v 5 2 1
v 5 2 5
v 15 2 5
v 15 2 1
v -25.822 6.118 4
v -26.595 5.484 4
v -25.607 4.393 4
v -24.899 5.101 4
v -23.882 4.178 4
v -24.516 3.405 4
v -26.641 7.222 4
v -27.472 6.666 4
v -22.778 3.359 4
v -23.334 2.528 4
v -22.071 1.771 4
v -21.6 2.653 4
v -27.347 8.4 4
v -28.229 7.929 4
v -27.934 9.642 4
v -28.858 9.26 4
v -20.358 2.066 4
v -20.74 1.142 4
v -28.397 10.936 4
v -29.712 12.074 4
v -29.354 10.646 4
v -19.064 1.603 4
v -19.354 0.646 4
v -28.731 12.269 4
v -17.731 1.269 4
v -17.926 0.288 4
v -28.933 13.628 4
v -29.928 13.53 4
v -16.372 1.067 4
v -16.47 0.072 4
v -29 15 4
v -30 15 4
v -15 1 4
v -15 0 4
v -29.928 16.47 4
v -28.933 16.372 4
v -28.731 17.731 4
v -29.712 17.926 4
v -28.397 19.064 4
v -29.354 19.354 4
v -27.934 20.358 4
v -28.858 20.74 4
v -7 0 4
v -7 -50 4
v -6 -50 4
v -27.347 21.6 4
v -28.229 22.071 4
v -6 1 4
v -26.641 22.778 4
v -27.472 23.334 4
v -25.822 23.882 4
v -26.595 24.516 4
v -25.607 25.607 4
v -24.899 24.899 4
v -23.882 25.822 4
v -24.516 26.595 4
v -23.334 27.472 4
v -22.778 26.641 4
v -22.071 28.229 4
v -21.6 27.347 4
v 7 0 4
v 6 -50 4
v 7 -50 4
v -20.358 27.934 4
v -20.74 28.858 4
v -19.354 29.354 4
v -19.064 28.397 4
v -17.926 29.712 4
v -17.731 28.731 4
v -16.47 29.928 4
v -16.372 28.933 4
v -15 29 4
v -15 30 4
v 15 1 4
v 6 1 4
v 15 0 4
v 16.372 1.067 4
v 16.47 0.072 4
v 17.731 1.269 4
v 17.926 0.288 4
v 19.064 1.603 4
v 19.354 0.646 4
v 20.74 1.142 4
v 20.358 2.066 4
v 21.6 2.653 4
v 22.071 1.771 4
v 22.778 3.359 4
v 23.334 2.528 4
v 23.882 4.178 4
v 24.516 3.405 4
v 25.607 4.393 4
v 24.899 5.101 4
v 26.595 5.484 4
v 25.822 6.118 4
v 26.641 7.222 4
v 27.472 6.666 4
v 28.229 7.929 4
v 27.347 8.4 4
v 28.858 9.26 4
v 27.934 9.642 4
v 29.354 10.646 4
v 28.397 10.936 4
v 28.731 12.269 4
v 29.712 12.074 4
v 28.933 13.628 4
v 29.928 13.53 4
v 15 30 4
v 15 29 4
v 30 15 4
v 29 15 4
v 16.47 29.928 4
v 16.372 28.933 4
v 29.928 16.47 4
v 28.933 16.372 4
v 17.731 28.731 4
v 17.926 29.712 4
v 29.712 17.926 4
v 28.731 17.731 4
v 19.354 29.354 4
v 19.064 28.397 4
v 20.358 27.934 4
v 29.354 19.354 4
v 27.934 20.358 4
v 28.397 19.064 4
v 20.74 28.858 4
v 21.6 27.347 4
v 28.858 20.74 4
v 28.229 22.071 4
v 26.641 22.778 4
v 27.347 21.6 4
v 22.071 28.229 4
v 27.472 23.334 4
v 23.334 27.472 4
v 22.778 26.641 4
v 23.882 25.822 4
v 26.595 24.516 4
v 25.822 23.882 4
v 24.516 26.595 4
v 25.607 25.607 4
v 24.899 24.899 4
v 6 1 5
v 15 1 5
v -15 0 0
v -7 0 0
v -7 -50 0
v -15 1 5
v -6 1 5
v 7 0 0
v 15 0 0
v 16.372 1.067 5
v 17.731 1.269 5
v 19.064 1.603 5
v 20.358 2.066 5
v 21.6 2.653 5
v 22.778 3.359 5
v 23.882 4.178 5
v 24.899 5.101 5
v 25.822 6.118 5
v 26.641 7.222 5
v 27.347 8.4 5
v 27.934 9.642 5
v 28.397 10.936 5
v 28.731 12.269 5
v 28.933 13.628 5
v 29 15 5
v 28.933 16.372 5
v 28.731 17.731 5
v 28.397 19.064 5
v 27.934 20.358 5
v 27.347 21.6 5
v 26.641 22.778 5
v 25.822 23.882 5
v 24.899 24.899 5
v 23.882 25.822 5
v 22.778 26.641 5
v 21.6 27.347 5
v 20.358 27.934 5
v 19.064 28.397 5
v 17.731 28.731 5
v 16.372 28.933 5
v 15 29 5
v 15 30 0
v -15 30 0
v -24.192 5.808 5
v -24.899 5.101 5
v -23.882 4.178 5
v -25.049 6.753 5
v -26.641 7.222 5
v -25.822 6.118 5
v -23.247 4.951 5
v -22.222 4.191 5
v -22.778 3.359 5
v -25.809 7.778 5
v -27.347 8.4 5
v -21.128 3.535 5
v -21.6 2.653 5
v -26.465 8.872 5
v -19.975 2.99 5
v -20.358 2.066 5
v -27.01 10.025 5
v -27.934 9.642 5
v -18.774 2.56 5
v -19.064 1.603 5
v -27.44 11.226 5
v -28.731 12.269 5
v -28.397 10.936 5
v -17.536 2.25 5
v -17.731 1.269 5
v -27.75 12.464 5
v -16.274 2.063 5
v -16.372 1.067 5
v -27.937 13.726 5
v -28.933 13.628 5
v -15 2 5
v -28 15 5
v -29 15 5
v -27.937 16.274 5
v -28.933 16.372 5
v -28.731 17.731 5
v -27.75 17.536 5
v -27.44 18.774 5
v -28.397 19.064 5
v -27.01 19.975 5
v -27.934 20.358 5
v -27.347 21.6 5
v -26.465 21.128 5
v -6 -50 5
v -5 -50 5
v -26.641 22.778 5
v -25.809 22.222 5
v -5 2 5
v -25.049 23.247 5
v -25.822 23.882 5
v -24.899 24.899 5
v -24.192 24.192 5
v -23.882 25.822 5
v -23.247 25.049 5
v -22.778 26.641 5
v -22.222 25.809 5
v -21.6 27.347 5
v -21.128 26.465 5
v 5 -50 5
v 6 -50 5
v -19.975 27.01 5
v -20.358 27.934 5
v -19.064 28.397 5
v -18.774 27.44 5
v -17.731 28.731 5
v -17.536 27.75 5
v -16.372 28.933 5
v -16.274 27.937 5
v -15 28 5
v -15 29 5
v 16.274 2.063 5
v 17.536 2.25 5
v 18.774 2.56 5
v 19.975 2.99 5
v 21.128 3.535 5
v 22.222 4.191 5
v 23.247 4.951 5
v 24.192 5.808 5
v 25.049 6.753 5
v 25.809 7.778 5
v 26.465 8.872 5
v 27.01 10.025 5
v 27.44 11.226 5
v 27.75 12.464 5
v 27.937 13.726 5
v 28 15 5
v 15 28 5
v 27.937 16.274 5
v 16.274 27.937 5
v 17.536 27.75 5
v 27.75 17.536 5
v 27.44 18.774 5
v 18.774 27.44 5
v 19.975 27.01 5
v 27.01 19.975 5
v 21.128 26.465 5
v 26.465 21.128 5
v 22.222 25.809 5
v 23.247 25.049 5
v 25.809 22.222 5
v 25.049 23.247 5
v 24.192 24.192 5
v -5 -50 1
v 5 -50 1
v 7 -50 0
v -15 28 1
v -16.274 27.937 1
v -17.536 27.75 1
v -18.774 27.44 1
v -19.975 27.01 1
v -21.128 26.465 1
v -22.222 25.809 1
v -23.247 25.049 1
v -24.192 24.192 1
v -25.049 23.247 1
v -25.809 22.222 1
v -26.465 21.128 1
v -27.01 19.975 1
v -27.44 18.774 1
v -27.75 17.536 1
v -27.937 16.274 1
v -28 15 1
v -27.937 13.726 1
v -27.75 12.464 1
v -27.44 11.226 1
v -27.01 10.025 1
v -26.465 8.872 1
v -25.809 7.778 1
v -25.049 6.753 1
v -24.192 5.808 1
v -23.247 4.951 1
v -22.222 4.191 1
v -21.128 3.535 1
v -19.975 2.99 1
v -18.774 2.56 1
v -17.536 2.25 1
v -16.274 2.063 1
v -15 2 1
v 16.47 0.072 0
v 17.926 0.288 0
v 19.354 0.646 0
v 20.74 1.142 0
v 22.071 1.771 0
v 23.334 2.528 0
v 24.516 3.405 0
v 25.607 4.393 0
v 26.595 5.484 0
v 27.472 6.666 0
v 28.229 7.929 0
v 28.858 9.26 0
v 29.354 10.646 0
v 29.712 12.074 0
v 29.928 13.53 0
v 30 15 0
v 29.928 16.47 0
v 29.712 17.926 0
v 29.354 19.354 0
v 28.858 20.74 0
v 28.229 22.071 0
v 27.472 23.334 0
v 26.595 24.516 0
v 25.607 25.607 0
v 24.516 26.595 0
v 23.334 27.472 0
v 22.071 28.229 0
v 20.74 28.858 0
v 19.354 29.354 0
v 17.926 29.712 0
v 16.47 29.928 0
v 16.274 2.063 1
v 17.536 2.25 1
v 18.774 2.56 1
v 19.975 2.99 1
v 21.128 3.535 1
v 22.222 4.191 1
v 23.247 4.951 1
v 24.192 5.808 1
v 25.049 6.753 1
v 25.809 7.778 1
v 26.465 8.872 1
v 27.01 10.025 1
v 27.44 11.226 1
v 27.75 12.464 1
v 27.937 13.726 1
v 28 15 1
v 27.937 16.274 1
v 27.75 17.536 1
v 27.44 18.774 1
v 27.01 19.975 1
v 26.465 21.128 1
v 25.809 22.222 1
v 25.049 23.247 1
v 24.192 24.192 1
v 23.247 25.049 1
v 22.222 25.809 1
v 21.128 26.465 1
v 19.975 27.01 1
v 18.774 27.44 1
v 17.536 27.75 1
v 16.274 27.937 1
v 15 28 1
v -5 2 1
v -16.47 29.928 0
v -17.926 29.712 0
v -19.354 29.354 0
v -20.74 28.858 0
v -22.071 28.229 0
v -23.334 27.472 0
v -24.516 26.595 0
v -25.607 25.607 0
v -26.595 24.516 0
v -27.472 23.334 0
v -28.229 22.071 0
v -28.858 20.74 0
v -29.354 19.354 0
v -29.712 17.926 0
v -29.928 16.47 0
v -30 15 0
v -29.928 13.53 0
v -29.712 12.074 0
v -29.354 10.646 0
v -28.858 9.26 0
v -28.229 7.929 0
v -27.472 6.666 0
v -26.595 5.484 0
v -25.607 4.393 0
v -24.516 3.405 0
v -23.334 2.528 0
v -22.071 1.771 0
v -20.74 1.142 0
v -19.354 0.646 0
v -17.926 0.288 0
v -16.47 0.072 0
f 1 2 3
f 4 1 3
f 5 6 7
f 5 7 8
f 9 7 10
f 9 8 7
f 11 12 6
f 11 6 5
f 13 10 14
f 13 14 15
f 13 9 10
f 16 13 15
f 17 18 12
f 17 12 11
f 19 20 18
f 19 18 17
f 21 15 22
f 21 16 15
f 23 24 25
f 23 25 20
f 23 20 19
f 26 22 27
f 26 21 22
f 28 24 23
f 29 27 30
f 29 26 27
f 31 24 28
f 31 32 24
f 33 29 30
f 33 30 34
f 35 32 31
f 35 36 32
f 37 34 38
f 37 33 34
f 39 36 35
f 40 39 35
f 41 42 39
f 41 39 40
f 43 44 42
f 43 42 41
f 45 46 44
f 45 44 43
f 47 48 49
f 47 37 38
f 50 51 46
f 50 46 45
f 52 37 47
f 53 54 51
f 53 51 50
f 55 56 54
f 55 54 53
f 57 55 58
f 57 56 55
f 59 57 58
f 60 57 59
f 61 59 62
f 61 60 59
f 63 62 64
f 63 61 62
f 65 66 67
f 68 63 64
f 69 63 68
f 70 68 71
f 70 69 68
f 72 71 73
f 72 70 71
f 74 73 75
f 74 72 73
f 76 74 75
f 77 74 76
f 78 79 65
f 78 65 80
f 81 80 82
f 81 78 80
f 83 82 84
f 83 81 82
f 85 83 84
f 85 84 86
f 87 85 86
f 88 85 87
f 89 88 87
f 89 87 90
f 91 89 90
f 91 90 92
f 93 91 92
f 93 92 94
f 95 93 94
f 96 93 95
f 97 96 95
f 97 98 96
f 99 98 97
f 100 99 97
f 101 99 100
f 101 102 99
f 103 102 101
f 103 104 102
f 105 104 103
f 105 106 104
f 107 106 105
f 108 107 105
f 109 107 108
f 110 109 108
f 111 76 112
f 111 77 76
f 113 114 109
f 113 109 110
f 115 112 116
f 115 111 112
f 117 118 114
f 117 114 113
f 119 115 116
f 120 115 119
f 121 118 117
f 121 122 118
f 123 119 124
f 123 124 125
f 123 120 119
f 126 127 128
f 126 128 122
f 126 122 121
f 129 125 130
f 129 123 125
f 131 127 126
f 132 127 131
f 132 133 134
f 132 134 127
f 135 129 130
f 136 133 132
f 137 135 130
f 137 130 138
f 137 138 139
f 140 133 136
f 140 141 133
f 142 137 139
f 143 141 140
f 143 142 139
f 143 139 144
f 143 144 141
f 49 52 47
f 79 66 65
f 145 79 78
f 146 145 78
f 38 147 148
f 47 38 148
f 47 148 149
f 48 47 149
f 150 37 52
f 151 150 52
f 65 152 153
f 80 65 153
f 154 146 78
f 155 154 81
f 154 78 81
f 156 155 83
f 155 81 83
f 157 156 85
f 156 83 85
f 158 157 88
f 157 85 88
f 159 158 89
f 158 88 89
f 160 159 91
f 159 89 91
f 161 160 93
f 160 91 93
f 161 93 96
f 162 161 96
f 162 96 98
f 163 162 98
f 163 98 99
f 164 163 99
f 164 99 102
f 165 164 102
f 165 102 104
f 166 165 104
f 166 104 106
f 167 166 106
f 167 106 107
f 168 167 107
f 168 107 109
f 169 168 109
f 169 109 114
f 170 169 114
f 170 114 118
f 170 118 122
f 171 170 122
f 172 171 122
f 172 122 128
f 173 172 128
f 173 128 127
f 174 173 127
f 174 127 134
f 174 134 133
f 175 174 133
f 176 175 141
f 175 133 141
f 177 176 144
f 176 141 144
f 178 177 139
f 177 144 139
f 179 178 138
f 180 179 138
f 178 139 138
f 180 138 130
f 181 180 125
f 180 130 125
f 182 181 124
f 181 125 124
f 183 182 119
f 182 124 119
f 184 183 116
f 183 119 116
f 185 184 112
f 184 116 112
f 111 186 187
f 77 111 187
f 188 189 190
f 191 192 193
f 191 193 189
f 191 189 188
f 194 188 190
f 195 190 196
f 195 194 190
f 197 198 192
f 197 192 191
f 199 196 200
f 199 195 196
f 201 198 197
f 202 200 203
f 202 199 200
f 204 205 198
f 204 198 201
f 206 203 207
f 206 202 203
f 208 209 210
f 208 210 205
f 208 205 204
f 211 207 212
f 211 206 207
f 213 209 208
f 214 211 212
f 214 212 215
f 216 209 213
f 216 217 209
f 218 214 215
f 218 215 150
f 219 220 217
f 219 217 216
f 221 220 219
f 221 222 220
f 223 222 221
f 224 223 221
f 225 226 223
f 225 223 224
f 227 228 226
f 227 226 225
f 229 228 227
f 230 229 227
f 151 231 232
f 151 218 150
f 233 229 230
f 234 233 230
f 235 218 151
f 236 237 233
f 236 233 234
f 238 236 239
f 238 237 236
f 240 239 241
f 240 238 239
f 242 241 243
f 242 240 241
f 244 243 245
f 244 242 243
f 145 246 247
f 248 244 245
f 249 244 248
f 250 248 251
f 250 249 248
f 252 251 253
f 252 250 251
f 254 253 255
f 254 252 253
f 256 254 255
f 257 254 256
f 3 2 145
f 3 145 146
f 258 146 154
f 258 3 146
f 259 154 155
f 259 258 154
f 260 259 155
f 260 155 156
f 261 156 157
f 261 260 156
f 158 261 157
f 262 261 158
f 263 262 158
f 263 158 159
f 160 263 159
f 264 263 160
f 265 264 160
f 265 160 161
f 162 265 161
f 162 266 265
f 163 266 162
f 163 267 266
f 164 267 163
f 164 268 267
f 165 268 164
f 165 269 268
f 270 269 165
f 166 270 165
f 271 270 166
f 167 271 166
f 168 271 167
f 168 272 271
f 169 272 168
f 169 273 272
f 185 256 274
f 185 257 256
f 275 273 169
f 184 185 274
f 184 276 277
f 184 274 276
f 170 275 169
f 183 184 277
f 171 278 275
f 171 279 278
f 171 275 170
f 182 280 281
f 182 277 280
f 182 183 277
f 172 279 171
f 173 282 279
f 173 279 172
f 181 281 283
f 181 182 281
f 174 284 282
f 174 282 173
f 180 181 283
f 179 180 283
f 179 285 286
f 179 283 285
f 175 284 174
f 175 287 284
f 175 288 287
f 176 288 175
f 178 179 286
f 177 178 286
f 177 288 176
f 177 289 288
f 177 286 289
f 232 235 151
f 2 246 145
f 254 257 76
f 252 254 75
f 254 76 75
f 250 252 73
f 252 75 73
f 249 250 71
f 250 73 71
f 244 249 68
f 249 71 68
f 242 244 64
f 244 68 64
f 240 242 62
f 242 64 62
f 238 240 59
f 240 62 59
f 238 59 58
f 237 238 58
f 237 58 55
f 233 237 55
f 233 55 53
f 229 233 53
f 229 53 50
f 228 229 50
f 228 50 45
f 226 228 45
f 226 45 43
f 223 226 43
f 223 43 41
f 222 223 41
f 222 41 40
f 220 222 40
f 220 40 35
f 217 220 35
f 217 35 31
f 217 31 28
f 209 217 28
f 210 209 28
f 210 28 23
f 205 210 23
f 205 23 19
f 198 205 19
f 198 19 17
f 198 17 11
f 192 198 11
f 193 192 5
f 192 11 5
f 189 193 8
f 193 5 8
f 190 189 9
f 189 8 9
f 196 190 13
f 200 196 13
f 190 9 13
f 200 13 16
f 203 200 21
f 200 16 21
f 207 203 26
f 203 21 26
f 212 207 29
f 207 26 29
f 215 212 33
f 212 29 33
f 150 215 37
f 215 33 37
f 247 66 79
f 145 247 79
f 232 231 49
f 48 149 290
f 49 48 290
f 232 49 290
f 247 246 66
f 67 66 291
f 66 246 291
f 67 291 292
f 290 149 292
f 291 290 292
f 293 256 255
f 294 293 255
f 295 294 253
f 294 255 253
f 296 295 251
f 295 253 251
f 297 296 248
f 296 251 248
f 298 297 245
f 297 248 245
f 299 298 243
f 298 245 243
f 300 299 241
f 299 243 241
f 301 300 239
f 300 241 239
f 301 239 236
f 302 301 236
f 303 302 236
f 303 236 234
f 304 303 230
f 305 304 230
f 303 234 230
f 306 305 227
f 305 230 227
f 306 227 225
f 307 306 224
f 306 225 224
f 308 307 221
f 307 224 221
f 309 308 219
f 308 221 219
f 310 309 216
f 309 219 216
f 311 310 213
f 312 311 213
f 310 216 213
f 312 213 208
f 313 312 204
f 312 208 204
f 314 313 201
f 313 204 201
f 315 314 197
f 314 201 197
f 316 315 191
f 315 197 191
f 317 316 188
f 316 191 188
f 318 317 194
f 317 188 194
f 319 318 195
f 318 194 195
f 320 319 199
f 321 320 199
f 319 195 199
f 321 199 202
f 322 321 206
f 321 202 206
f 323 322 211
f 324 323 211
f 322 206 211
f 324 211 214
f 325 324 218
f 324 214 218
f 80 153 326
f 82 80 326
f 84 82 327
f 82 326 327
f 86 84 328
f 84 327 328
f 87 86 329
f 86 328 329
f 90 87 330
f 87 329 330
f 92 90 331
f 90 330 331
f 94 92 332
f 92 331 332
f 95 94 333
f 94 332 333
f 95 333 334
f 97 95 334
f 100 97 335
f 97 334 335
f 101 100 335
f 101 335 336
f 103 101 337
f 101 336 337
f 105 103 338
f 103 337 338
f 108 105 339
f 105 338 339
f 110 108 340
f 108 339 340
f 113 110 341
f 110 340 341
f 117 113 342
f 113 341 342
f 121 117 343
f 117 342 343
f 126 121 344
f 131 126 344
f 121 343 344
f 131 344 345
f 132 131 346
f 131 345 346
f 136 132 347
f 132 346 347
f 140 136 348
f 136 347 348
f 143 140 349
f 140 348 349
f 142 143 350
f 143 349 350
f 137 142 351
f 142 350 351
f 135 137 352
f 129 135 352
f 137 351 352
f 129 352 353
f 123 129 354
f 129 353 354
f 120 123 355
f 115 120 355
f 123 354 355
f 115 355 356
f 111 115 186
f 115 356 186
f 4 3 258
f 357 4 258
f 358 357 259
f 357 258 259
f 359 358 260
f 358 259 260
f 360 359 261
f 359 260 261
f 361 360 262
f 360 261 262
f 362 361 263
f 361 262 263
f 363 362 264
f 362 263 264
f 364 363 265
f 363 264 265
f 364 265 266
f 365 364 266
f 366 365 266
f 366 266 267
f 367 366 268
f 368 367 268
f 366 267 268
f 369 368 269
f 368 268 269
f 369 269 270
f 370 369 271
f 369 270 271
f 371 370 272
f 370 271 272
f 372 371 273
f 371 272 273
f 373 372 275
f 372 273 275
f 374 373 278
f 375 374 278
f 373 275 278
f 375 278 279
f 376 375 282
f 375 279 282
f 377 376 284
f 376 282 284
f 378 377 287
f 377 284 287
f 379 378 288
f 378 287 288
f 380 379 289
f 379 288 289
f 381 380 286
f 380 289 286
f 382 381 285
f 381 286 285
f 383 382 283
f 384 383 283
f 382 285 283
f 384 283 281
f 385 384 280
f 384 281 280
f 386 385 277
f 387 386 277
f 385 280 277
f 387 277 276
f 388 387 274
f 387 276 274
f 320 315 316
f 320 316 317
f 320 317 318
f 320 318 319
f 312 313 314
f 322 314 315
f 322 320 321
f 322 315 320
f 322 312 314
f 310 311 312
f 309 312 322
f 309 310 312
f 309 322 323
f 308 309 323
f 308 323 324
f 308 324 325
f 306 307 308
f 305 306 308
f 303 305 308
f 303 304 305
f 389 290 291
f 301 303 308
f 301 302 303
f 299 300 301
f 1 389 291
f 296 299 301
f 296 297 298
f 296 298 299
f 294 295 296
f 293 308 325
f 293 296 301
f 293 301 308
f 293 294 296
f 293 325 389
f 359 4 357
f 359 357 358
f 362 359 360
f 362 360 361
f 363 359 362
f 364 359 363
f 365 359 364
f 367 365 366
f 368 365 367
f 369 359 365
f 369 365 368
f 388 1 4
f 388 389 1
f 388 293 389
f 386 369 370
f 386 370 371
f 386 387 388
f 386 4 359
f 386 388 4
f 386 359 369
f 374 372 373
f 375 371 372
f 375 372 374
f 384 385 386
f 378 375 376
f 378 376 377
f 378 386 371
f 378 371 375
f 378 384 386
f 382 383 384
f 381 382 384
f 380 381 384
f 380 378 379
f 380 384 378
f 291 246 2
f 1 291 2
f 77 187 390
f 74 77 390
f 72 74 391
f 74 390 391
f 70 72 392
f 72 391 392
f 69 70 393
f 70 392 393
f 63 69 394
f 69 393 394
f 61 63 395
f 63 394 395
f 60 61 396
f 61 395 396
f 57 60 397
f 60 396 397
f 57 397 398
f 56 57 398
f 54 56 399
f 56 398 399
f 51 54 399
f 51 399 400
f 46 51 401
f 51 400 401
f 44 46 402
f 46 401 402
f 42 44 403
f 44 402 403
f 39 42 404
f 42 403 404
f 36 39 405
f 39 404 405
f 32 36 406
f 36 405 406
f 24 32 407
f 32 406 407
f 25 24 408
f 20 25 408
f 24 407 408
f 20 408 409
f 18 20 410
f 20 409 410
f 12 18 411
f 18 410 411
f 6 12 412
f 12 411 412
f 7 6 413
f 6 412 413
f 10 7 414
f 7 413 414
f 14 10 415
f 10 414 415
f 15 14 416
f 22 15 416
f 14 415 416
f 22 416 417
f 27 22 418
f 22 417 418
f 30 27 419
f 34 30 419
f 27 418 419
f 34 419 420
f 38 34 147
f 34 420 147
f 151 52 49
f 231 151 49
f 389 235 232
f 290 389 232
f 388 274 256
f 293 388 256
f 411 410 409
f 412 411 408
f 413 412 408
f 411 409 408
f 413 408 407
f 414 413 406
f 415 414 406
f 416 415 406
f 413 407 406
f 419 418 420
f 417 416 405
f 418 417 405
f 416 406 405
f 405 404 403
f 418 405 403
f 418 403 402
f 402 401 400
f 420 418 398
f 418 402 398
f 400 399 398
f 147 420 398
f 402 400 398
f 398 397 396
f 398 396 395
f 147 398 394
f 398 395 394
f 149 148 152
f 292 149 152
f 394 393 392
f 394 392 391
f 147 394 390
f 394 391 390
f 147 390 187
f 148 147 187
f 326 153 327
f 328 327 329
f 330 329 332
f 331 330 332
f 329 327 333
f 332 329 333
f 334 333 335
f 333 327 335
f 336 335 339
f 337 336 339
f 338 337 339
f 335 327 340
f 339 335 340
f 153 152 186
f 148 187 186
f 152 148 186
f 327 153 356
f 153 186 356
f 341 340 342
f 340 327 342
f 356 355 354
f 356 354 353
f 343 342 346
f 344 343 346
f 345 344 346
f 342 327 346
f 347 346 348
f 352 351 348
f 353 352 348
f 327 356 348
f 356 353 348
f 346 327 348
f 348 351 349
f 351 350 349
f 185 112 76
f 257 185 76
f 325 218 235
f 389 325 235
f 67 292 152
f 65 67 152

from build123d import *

# Parameters (mm, degrees)
PAD_DEPTH    = 4
PAD001_DEPTH = 5
POCKET_DEPTH = 4


with BuildPart() as part:
    # Sketch → Pad (new body)
    with BuildSketch(Plane.XY):
        with BuildLine():
            Line((-7, -50), (7, -50))
            Line((7, -50), (7, 0))
            Line((7, 0), (15, 0))
            ThreePointArc((15, 0), (30, 15), (15, 30))
            Line((15, 30), (-15, 30))
            ThreePointArc((-15, 30), (-30, 15), (-15, 0))
            Line((-15, 0), (-7, 0))
            Line((-7, 0), (-7, -50))
        make_face()
    extrude(amount=PAD_DEPTH)

    # Sketch001 → Pad001 (join)
    with BuildSketch(Plane.XY):
        with BuildLine():
            Line((-6, -50), (6, -50))
            Line((6, -50), (6, 1))
            Line((6, 1), (15, 1))
            ThreePointArc((15, 1), (29, 15), (15, 29))
            Line((15, 29), (-15, 29))
            ThreePointArc((-15, 29), (-29, 15), (-15, 1))
            Line((-15, 1), (-6, 1))
            Line((-6, 1), (-6, -50))
        make_face()
    extrude(amount=PAD001_DEPTH)

    # Sketch002 → Pocket (cut)
    with BuildSketch(Plane.XY.offset(5)):
        with BuildLine():
            Line((-5, -50), (5, -50))
            Line((5, -50), (5, 2))
            Line((5, 2), (15, 2))
            ThreePointArc((15, 2), (28, 15), (15, 28))
            Line((15, 28), (-15, 28))
            ThreePointArc((-15, 28), (-28, 15), (-15, 2))
            Line((-15, 2), (-5, 2))
            Line((-5, 2), (-5, -50))
        make_face()
    extrude(amount=-POCKET_DEPTH, mode=Mode.SUBTRACT)


solid = part.part
